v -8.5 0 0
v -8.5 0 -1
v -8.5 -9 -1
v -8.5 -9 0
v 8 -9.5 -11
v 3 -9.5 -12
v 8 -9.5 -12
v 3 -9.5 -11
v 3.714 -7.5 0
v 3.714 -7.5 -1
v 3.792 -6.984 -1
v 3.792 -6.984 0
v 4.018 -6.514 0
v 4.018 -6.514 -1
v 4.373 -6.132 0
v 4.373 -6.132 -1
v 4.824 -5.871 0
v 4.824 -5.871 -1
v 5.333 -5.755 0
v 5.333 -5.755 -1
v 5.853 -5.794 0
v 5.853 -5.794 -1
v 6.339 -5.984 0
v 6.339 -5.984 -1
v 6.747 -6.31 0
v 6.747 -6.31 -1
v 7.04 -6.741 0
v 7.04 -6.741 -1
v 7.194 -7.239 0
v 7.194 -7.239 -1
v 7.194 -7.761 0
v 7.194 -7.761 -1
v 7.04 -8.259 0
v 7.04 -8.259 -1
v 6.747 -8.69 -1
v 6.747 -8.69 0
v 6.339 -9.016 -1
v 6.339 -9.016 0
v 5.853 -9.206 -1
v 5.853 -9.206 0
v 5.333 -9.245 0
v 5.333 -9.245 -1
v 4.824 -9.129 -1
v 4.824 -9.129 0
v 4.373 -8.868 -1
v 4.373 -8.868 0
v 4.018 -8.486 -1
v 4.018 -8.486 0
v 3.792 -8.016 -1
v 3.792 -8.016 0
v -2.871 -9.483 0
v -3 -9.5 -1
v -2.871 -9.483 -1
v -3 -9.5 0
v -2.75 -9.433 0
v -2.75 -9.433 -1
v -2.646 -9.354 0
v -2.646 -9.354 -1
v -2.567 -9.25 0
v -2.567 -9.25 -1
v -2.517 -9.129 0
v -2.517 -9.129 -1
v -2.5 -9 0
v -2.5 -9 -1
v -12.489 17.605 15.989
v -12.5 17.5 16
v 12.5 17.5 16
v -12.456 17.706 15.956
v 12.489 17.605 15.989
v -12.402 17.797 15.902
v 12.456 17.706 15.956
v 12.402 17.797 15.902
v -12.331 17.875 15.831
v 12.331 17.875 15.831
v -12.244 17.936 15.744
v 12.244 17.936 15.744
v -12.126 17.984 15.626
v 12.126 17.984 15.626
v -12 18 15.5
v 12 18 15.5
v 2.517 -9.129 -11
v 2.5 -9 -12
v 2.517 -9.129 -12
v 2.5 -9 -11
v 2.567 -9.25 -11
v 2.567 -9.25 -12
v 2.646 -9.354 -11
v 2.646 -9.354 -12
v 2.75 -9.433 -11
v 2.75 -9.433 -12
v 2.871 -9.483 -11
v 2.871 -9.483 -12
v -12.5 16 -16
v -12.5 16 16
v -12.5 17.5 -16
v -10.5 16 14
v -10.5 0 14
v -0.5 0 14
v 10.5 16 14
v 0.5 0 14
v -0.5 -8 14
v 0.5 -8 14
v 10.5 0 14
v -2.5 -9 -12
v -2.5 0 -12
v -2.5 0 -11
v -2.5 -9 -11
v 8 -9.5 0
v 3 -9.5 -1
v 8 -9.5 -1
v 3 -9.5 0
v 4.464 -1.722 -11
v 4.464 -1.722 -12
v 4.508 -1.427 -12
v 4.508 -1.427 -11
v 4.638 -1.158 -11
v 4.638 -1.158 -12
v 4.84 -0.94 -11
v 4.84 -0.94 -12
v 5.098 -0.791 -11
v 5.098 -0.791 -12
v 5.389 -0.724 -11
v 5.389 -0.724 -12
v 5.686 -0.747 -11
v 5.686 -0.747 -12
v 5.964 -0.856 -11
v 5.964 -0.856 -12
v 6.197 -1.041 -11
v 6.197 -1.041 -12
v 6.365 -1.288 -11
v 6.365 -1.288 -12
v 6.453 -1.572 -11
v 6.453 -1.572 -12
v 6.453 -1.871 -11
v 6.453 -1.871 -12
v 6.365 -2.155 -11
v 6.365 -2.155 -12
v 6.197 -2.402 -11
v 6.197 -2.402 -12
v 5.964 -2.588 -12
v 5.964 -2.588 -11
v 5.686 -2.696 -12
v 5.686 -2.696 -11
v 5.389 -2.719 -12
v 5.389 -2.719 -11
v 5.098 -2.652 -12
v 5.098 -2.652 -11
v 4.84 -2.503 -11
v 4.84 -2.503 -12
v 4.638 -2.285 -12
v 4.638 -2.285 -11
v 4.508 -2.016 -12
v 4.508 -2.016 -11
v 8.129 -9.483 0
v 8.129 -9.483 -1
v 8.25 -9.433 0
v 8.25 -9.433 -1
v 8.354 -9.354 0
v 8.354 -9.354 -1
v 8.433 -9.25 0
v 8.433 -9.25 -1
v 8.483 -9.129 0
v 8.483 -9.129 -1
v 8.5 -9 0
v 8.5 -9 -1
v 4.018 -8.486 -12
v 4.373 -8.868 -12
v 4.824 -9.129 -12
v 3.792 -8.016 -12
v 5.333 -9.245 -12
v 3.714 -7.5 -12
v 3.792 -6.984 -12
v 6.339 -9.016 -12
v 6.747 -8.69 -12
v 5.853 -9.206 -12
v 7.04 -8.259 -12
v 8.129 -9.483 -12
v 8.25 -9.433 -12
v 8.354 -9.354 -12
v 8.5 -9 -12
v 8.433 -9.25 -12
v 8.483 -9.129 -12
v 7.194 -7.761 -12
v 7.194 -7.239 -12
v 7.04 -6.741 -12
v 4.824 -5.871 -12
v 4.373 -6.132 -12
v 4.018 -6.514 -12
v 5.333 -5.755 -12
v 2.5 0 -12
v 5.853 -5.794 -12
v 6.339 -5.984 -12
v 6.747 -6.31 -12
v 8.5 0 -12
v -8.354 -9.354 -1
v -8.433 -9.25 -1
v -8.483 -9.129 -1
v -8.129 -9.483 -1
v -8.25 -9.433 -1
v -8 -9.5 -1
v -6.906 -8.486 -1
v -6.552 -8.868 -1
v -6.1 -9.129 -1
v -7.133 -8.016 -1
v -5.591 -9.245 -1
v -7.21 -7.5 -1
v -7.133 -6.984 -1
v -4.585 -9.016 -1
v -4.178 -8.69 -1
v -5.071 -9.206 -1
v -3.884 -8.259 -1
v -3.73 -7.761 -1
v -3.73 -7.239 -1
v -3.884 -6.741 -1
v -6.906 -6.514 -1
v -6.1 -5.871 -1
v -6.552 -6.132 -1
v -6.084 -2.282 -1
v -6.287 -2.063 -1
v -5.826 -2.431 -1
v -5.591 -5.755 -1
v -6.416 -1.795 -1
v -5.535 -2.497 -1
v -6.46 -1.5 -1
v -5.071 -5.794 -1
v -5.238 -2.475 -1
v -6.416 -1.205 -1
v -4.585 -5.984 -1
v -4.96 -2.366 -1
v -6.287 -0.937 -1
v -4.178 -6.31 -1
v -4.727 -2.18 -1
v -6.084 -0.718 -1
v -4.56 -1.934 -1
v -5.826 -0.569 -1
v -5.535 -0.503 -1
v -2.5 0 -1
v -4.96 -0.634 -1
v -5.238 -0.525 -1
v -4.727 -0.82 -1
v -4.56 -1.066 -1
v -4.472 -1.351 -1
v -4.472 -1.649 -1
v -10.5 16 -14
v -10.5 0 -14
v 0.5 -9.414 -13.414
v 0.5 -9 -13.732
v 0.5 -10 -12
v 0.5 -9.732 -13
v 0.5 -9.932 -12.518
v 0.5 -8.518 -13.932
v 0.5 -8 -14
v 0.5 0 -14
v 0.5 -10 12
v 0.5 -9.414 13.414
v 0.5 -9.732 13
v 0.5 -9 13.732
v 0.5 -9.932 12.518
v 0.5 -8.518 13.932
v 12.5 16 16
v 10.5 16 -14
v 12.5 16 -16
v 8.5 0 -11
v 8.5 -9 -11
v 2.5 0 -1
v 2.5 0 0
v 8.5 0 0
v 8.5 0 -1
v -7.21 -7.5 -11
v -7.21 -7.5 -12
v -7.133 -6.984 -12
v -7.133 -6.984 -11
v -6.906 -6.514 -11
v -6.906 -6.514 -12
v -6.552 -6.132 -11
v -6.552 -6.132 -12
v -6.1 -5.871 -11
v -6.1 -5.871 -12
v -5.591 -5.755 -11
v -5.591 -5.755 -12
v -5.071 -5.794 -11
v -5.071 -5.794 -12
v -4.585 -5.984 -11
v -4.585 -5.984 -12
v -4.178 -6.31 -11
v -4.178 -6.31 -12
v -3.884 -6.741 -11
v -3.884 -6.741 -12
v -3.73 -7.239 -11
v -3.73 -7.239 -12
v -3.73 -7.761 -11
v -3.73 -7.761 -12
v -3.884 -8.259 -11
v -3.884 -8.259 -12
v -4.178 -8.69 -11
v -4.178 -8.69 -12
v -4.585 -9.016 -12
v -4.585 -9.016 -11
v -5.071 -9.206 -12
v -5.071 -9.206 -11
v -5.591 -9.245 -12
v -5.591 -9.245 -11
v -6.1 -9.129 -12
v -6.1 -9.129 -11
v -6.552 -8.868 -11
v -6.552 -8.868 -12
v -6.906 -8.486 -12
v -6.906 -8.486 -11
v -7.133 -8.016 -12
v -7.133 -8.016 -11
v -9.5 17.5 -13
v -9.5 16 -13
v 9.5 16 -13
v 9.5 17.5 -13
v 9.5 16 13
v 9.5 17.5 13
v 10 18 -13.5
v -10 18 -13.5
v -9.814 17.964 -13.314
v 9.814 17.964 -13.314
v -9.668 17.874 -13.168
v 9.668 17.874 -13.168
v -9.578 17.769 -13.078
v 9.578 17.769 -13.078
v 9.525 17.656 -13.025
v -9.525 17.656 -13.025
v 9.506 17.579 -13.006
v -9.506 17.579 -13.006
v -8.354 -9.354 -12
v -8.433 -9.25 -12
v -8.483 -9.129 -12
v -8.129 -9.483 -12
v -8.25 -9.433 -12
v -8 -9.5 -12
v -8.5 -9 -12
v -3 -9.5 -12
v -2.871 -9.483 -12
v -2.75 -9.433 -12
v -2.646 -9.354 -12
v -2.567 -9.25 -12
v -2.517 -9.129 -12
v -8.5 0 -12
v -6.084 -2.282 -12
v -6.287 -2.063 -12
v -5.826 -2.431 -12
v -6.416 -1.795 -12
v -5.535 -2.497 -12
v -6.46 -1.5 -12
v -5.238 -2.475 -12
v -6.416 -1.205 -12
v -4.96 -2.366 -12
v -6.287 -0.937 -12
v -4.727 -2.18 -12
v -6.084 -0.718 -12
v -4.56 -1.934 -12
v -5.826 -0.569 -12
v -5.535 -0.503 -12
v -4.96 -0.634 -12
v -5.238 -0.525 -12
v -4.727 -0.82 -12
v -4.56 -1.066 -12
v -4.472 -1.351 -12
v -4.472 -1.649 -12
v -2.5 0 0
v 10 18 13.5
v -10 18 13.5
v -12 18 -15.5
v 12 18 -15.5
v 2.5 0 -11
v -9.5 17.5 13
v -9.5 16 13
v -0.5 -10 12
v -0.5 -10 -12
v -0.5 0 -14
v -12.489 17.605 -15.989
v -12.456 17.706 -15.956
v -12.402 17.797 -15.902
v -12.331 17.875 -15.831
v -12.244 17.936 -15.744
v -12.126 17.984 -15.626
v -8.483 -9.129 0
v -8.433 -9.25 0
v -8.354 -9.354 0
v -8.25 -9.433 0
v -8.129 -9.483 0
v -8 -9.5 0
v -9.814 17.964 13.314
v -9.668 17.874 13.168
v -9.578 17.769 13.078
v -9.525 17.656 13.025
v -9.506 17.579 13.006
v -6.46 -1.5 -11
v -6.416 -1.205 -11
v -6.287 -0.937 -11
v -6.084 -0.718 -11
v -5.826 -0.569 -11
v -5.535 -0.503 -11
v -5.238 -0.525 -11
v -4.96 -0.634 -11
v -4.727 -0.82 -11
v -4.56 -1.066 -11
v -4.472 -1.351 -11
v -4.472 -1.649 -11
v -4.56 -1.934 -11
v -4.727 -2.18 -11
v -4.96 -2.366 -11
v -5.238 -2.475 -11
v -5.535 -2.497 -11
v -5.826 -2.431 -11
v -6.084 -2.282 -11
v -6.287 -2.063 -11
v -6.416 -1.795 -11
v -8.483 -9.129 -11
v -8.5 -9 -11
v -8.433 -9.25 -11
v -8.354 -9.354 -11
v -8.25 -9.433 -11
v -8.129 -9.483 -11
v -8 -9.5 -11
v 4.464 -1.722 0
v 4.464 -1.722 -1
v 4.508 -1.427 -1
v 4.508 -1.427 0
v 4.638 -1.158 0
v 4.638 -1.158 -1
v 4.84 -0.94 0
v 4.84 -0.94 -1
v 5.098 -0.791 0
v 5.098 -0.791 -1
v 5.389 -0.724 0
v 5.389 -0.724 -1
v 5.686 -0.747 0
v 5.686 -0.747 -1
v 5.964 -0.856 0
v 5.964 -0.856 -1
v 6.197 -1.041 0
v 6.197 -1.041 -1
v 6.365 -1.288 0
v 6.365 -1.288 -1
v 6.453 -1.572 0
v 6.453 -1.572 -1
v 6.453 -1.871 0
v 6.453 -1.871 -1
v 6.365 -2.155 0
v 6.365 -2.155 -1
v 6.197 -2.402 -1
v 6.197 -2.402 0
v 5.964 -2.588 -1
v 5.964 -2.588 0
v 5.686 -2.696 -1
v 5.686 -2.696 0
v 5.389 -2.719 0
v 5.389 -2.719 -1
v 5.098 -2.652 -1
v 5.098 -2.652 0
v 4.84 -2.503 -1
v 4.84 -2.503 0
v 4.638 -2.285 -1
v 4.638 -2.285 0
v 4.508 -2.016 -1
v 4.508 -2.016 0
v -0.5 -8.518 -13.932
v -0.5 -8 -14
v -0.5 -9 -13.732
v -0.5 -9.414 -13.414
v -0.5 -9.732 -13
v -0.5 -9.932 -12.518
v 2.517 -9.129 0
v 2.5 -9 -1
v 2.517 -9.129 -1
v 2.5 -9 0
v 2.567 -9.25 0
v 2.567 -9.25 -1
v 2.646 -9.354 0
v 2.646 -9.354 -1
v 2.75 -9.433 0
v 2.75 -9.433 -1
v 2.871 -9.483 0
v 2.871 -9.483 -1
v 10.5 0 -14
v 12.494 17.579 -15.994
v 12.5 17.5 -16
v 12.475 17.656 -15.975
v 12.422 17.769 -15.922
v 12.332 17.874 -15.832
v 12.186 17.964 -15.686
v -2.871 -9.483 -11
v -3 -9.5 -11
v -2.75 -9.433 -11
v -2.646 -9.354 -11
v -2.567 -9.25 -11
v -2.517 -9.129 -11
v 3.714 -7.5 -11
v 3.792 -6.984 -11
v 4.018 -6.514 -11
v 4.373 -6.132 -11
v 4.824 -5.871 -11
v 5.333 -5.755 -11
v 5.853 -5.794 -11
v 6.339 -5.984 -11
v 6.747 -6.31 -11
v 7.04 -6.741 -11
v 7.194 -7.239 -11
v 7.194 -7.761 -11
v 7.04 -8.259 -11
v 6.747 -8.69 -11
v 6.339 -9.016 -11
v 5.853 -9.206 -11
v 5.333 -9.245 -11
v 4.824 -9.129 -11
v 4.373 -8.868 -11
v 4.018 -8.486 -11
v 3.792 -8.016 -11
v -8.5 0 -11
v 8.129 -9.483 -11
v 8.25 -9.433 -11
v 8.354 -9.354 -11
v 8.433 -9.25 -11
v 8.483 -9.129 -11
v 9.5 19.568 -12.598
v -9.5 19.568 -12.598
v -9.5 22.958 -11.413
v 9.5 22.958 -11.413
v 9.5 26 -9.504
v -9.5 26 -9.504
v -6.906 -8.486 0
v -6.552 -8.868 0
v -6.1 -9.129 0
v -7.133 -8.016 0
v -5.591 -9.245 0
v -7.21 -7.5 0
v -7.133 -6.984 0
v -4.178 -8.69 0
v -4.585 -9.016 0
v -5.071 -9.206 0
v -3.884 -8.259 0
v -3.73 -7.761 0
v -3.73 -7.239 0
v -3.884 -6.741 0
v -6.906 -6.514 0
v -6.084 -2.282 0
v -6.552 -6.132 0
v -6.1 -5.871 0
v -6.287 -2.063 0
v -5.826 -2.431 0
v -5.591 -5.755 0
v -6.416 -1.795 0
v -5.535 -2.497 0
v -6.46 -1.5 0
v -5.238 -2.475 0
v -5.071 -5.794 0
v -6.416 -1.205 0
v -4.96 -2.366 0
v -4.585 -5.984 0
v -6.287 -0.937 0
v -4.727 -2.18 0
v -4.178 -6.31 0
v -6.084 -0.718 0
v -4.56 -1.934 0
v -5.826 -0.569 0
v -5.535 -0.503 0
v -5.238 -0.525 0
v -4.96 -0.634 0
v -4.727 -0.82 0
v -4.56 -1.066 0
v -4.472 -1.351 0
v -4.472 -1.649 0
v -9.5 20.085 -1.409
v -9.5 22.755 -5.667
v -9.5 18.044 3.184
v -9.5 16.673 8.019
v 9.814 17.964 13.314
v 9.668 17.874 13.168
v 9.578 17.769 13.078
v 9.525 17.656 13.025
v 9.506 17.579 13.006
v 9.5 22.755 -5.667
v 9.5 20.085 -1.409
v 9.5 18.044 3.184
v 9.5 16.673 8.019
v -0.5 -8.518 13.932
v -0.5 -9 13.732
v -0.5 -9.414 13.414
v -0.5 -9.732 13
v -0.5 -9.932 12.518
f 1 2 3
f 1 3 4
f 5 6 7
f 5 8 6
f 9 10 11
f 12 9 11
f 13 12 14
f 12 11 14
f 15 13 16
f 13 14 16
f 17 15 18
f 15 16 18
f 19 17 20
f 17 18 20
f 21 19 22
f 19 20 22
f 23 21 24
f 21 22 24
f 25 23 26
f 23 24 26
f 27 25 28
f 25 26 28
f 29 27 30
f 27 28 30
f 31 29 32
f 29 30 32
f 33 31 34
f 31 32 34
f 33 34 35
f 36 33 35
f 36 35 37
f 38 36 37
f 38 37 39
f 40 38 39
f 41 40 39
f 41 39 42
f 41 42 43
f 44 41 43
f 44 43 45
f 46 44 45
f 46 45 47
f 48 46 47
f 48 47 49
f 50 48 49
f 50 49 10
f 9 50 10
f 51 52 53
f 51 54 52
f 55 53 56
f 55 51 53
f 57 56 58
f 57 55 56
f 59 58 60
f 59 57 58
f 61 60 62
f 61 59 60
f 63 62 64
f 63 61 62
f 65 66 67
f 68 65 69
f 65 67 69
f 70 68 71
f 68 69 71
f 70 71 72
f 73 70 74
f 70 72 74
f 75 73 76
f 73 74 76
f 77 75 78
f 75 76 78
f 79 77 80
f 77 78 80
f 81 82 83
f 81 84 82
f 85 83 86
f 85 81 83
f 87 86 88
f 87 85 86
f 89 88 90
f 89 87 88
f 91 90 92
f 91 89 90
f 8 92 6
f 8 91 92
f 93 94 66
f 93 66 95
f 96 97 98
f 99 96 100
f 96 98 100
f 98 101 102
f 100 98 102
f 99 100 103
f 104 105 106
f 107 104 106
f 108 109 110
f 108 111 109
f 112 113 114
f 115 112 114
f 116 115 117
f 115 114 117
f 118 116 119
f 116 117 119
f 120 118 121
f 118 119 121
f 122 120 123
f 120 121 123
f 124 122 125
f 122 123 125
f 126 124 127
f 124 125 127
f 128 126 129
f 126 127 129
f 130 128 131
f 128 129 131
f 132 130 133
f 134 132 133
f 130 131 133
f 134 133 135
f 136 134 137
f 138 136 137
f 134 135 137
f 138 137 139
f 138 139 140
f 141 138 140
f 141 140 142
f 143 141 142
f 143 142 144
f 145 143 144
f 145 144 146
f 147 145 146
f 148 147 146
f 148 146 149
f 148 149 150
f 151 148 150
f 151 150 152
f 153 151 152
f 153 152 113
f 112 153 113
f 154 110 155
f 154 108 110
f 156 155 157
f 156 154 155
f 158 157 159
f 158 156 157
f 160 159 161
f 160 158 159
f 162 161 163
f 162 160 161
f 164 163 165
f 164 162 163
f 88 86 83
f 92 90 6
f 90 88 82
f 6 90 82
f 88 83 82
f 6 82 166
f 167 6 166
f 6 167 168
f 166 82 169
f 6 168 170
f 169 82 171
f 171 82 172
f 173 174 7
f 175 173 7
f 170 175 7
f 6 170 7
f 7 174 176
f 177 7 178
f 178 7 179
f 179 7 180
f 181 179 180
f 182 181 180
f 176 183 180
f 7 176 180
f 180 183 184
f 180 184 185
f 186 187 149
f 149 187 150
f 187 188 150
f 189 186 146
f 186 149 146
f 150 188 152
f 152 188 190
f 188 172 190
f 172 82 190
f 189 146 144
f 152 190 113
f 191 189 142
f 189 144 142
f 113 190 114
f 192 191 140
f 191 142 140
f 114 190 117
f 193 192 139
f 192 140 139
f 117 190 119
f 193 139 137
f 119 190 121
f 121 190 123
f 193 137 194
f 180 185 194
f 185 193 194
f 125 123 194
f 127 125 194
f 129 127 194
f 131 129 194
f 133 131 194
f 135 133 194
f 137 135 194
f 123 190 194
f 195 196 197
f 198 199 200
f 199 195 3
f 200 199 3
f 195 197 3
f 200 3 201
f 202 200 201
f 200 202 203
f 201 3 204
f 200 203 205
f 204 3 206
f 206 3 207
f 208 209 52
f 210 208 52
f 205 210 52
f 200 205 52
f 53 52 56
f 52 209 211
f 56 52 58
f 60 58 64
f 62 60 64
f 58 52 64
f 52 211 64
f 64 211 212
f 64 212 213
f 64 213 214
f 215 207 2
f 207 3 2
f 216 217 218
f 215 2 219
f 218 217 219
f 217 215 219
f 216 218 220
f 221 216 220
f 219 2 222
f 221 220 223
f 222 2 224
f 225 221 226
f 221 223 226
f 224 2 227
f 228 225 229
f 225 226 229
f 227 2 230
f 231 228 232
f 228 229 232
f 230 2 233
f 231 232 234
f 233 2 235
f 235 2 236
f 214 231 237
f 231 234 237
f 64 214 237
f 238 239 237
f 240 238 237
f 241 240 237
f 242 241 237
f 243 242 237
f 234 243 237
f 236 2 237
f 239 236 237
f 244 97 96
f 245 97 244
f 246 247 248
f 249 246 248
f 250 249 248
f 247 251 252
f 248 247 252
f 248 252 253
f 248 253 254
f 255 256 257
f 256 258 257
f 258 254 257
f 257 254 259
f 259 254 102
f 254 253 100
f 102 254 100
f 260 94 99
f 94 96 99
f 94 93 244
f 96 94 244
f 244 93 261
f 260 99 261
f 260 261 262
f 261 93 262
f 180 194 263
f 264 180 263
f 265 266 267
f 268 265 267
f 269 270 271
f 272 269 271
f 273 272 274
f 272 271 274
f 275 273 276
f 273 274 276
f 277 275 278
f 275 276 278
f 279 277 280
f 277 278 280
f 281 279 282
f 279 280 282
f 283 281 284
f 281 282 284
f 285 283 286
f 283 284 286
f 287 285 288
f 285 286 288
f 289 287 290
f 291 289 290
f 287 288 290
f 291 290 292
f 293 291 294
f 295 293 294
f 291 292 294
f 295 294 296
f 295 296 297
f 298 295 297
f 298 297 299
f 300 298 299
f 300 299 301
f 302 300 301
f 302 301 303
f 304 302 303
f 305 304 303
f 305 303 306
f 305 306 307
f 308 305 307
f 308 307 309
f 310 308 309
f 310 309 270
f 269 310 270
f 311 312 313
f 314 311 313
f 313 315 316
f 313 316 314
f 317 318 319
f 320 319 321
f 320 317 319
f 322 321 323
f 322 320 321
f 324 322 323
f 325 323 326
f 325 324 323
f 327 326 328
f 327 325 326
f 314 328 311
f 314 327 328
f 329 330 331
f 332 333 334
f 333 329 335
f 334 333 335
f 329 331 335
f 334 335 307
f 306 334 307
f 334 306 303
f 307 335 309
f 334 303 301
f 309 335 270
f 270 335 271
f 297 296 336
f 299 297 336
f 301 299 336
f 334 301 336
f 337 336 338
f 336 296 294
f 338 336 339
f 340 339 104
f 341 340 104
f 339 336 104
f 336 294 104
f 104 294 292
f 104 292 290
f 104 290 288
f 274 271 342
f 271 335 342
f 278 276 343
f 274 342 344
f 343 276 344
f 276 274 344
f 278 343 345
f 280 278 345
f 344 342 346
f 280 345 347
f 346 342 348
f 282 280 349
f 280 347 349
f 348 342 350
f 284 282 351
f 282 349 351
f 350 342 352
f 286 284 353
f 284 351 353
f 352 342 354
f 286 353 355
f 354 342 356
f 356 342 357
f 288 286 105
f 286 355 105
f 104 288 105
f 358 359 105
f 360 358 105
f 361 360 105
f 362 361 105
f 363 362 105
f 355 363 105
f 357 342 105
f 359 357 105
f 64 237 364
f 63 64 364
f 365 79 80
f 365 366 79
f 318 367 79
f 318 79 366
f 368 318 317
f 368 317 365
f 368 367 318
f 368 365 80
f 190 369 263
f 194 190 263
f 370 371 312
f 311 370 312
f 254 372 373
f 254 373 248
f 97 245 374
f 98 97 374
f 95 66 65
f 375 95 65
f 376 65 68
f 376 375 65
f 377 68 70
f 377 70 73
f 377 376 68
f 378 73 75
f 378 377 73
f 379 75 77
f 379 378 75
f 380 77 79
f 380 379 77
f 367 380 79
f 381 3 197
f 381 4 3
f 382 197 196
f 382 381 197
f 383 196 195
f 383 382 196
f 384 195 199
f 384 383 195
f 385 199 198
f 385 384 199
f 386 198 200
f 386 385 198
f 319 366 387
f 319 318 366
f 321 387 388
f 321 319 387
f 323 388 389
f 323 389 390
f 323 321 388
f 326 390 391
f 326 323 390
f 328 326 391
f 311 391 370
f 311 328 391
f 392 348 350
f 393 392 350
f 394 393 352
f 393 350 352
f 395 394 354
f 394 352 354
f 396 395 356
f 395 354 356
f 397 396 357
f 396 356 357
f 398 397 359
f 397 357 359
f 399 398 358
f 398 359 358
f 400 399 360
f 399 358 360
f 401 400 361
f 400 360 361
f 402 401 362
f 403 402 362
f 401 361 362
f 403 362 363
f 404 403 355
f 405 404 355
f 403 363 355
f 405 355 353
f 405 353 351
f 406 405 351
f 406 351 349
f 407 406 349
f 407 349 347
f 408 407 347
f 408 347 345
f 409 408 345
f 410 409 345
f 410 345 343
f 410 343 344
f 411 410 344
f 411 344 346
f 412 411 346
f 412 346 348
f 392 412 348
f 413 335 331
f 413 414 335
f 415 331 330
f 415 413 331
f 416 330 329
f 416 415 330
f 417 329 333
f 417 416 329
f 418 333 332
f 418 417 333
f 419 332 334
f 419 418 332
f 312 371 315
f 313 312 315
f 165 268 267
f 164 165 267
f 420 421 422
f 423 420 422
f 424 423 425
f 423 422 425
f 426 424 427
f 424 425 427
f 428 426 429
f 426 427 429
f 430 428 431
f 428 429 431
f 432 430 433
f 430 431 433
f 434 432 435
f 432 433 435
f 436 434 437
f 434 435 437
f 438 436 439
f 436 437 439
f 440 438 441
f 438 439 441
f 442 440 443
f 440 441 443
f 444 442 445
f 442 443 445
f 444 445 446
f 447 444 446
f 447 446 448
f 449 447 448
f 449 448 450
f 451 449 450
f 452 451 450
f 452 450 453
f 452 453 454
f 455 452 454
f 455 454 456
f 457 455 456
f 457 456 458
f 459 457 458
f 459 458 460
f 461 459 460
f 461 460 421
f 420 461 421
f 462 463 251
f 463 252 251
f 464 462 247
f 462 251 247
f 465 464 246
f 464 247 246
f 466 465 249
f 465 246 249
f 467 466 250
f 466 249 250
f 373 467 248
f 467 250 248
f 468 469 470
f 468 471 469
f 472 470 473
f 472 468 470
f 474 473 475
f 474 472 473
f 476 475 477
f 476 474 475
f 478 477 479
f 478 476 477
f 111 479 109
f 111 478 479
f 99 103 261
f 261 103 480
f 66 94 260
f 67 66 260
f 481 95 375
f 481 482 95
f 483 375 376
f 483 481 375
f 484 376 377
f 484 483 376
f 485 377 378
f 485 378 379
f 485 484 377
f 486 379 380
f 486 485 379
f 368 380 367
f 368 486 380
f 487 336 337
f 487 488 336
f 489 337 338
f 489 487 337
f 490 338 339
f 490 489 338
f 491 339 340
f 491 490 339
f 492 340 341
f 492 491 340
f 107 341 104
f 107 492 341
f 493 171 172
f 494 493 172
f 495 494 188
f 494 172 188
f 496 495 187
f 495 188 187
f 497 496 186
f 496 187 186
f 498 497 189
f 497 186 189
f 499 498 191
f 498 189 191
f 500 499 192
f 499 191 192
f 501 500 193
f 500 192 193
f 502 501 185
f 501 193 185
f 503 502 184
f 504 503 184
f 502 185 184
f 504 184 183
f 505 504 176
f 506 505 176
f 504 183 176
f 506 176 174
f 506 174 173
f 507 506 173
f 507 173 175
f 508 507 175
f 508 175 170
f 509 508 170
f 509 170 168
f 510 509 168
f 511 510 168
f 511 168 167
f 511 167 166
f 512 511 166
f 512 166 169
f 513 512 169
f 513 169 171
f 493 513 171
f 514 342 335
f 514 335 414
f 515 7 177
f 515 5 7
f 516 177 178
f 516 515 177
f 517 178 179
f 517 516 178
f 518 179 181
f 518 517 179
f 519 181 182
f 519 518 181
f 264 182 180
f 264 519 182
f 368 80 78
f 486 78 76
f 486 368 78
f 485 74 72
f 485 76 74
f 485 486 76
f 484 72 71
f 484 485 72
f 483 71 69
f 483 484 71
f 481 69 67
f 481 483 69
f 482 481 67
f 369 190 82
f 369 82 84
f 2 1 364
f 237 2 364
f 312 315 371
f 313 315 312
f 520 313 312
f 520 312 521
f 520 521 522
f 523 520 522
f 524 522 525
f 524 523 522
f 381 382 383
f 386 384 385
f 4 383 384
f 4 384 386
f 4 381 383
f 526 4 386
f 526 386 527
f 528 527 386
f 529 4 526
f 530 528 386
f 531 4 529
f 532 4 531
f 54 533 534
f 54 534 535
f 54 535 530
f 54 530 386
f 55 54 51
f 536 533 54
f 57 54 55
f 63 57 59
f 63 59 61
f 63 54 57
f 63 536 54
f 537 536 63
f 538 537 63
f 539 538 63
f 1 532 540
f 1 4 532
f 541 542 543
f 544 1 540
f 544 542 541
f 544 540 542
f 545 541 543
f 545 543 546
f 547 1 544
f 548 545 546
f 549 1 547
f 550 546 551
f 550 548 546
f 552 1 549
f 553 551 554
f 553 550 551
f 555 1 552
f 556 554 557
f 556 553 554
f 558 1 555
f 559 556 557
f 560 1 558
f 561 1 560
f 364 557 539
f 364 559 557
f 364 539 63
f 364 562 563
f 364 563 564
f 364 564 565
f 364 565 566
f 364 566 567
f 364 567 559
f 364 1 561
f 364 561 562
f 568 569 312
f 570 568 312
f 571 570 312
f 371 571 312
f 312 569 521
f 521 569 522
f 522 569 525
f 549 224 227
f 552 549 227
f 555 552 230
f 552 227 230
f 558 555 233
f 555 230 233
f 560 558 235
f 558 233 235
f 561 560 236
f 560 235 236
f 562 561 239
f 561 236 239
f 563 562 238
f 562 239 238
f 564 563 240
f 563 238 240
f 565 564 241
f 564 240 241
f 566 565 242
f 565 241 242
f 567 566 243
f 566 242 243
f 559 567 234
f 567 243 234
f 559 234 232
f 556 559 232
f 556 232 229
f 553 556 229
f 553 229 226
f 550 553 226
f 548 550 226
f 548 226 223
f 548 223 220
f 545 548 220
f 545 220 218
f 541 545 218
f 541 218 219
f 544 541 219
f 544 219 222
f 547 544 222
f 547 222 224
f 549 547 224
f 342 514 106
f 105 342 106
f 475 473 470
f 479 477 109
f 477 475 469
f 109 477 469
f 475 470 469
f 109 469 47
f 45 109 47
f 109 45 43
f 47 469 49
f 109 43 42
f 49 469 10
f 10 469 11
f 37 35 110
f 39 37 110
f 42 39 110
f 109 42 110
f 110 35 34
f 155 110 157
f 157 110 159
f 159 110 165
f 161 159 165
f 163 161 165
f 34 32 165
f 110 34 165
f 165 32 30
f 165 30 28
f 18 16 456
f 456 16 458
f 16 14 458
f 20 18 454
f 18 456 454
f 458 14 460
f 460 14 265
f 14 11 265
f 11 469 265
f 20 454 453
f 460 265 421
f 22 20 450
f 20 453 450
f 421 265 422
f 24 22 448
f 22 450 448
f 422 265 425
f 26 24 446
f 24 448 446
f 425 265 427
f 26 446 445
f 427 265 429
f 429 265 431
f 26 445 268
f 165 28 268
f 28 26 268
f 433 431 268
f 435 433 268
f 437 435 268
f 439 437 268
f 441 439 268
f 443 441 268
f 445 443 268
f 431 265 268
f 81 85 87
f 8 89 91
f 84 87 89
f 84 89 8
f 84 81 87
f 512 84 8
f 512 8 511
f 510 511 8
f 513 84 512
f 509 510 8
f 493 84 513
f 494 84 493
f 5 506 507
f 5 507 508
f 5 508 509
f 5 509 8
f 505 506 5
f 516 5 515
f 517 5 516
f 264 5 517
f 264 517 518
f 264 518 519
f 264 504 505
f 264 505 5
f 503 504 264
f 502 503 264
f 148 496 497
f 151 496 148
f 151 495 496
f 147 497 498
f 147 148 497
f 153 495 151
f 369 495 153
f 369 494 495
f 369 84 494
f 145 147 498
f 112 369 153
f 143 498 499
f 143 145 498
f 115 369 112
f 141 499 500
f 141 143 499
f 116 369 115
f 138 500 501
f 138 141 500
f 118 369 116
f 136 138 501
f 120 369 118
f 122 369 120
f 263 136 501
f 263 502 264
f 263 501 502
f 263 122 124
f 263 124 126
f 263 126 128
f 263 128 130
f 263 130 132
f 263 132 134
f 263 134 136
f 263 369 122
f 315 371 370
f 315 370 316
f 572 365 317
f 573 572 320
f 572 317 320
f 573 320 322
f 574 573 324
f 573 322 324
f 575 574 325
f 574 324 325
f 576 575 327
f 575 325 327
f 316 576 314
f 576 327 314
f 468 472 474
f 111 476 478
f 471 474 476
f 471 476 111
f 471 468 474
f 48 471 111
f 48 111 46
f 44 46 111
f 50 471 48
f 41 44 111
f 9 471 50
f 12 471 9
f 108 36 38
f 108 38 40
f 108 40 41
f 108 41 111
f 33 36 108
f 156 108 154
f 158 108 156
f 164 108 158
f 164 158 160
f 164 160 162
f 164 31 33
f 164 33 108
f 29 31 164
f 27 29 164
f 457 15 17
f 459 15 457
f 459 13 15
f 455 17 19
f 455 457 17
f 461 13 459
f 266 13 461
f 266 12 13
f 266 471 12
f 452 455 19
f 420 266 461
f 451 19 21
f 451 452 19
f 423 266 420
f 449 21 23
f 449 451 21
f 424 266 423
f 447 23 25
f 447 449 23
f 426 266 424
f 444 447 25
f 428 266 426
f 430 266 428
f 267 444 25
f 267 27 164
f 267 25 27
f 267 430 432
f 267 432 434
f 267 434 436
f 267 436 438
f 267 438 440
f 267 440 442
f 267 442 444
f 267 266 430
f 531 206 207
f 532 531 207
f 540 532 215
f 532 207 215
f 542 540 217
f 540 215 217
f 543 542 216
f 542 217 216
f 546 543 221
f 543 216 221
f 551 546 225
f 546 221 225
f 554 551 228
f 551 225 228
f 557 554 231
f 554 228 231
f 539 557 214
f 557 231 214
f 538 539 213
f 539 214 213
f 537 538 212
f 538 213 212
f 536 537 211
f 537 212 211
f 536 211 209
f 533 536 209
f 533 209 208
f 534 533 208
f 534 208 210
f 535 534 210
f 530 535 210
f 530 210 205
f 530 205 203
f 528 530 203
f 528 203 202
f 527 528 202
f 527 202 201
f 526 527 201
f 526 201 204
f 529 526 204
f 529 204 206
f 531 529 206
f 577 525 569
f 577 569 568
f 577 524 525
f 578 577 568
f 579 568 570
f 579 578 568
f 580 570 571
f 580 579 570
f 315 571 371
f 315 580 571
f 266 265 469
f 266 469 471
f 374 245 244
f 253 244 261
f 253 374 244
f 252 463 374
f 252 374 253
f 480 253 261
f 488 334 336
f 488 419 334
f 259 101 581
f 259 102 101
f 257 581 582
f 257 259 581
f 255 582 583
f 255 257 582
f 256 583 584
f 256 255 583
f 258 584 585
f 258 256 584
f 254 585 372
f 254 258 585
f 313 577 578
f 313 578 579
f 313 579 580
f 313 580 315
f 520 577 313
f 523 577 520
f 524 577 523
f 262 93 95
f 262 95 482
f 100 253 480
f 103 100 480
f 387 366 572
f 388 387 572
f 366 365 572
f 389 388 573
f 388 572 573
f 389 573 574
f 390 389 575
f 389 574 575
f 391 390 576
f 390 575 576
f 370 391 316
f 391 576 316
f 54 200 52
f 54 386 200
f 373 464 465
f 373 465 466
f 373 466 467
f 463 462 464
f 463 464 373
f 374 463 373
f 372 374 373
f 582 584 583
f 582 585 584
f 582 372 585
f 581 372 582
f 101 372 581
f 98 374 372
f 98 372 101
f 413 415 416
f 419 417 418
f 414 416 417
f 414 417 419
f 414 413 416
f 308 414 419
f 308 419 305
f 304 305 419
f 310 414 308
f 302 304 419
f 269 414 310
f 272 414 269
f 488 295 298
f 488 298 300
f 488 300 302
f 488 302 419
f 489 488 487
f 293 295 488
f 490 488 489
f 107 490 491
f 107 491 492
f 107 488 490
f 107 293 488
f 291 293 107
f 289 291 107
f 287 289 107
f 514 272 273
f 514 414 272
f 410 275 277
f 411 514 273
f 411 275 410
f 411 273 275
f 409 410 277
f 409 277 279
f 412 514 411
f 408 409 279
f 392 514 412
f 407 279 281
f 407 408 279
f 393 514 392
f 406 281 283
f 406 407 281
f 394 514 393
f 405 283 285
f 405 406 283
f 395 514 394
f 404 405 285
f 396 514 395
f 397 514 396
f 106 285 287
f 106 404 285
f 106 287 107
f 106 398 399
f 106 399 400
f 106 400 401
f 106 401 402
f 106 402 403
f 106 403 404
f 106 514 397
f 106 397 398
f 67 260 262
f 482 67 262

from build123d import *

# Parameters (mm, degrees)
SKETCH1_W             = 21
SKETCH1_H             = 28
BOSS_EXTRUDE1_DEPTH   = 16
SKETCH2_W             = 25
SKETCH2_H             = 32
SKETCH2_W_2           = 19
SKETCH2_H_2           = 26
BOSS_EXTRUDE2_DEPTH   = 2
FILLET1_R             = 0.5
SKETCH3_W             = 1
SKETCH3_H             = 28
BOSS_EXTRUDE3_DEPTH   = 10
SKETCH4_W             = 6
SKETCH4_H             = 1
BOSS_EXTRUDE4_DEPTH   = 9.5
BOSS_EXTRUDE4_2_DEPTH = 9.5
BOSS_EXTRUDE4_3_DEPTH = 9.5
BOSS_EXTRUDE4_4_DEPTH = 9.5
SKETCH5_R             = 1
SKETCH5_R_2           = 1.75
CUT_EXTRUDE1_DEPTH    = 29
FILLET2_R             = 2
FILLET3_R             = 0.5
FILLET4_R             = 0.5
FILLET5_R             = 0.5
FILLET6_R             = 0.5
BOSS_EXTRUDE5_DEPTH   = 9.5


with BuildPart() as part:
    # Sketch1 → Boss-Extrude1 (new body)
    with BuildSketch(Plane(origin=(0, 0, 0), x_dir=(1, 0, 0), z_dir=(0, 1, 0))):
        Rectangle(SKETCH1_W, SKETCH1_H)
    extrude(amount=BOSS_EXTRUDE1_DEPTH)

    # Sketch2 → Boss-Extrude2 (add)
    with BuildSketch(Plane(origin=(0, 16, 0), x_dir=(1, 0, 0), z_dir=(0, 1, 0))):
        Rectangle(SKETCH2_W, SKETCH2_H)
        Rectangle(SKETCH2_W_2, SKETCH2_H_2, mode=Mode.SUBTRACT)
    extrude(amount=BOSS_EXTRUDE2_DEPTH)

    # Fillet1
    fillet1_edges = [part.edges().sort_by_distance(p)[0] for p in [
        (0, 18, 16),
        (12.5, 18, 0),
        (0, 18, -16),
        (-12.5, 18, 0),
        (0, 18, 13),
        (9.5, 18, 0),
        (0, 18, -13),
        (-9.5, 18, 0),
    ]]
    fillet(fillet1_edges, radius=FILLET1_R)

    # Sketch3 → Boss-Extrude3 (add)
    with BuildSketch(Plane.XZ):
        Rectangle(SKETCH3_W, SKETCH3_H)
    extrude(amount=BOSS_EXTRUDE3_DEPTH)

    # Fillet2
    fillet2_edges = [part.edges().sort_by_distance(p)[0] for p in [
        (0, -10, 14),
        (0, -10, -14),
    ]]
    fillet(fillet2_edges, radius=FILLET2_R)


with BuildPart() as body_2:
    # Sketch4 → Boss-Extrude4 (new body)
    with BuildSketch(Plane.XZ):
        with Locations((-5.5, -11.5)):
            Rectangle(SKETCH4_W, SKETCH4_H)
    extrude(amount=BOSS_EXTRUDE4_DEPTH)


with BuildPart() as body_3:
    # Sketch4 → Boss-Extrude4 2 (new body)
    with BuildSketch(Plane.XZ):
        with Locations((5.5, -0.5)):
            Rectangle(SKETCH4_W, SKETCH4_H)
    extrude(amount=BOSS_EXTRUDE4_2_DEPTH)


with BuildPart() as body_4:
    # Sketch4 → Boss-Extrude4 3 (new body)
    with BuildSketch(Plane.XZ):
        with Locations((-5.5, -0.5)):
            Rectangle(SKETCH4_W, SKETCH4_H)
    extrude(amount=BOSS_EXTRUDE4_3_DEPTH)


with BuildPart() as body_5:
    # Sketch4 → Boss-Extrude4 4 (new body)
    with BuildSketch(Plane.XZ):
        with Locations((5.5, -11.5)):
            Rectangle(SKETCH4_W, SKETCH4_H)
    extrude(amount=BOSS_EXTRUDE4_4_DEPTH)


with BuildPart() as cut_extrude1_tool:
    # Sketch5 → Cut-Extrude1 (new body, through all)
    with BuildSketch(Plane(origin=(0, 0, -12), x_dir=(-1, 0, 0), z_dir=(0, 0, -1))):
        with Locations((5.460485821, -1.5)):
            Circle(SKETCH5_R)
        with Locations((5.460485821, -7.5)):
            Circle(SKETCH5_R_2)
        with Locations((-5.463804128, -1.721530738)):
            Circle(SKETCH5_R)
        with Locations((-5.463804128, -7.5)):
            Circle(SKETCH5_R_2)
    extrude(amount=-CUT_EXTRUDE1_DEPTH)


with BuildPart() as body_2_1:
    add(body_2.part)

    # Cut-Extrude1: cut by cut_extrude1_tool
    add(cut_extrude1_tool.part, mode=Mode.SUBTRACT)

    # Fillet4
    fillet4_edges = [body_2_1.edges().sort_by_distance(p)[0] for p in [
        (-8.5, -9.5, -11.5),
        (-2.5, -9.5, -11.5),
    ]]
    fillet(fillet4_edges, radius=FILLET4_R)


with BuildPart() as body_3_1:
    add(body_3.part)

    # Cut-Extrude1: cut by cut_extrude1_tool
    add(cut_extrude1_tool.part, mode=Mode.SUBTRACT)

    # Fillet5
    fillet5_edges = [body_3_1.edges().sort_by_distance(p)[0] for p in [
        (2.5, -9.5, -0.5),
        (8.5, -9.5, -0.5),
    ]]
    fillet(fillet5_edges, radius=FILLET5_R)


with BuildPart() as body_4_1:
    add(body_4.part)

    # Cut-Extrude1: cut by cut_extrude1_tool
    add(cut_extrude1_tool.part, mode=Mode.SUBTRACT)

    # Fillet6
    fillet6_edges = [body_4_1.edges().sort_by_distance(p)[0] for p in [
        (-2.5, -9.5, -0.5),
        (-8.5, -9.5, -0.5),
    ]]
    fillet(fillet6_edges, radius=FILLET6_R)


with BuildPart() as body_5_1:
    add(body_5.part)

    # Cut-Extrude1: cut by cut_extrude1_tool
    add(cut_extrude1_tool.part, mode=Mode.SUBTRACT)

    # Fillet3
    fillet3_edges = [body_5_1.edges().sort_by_distance(p)[0] for p in [
        (8.5, -9.5, -11.5),
        (2.5, -9.5, -11.5),
    ]]
    fillet(fillet3_edges, radius=FILLET3_R)


with BuildPart() as body_6:
    # Sketch6 → Boss-Extrude5 (new body, symmetric)
    with BuildSketch(Plane(origin=(0, 0, 0), x_dir=(0, 0, -1), z_dir=(1, 0, 0))):
        with BuildLine():
            Line((-13, 16), (13, 16))
            ThreePointArc((13, 16), (12.100922241, 21.296677467), (9.504407239, 26))
            ThreePointArc((9.504407239, 26), (-0.851466502, 18.98286274), (-13, 16))
        make_face()
    extrude(amount=BOSS_EXTRUDE5_DEPTH, both=True)


solid = Compound([part.part, body_2_1.part, body_3_1.part, body_4_1.part, body_5_1.part, body_6.part])
